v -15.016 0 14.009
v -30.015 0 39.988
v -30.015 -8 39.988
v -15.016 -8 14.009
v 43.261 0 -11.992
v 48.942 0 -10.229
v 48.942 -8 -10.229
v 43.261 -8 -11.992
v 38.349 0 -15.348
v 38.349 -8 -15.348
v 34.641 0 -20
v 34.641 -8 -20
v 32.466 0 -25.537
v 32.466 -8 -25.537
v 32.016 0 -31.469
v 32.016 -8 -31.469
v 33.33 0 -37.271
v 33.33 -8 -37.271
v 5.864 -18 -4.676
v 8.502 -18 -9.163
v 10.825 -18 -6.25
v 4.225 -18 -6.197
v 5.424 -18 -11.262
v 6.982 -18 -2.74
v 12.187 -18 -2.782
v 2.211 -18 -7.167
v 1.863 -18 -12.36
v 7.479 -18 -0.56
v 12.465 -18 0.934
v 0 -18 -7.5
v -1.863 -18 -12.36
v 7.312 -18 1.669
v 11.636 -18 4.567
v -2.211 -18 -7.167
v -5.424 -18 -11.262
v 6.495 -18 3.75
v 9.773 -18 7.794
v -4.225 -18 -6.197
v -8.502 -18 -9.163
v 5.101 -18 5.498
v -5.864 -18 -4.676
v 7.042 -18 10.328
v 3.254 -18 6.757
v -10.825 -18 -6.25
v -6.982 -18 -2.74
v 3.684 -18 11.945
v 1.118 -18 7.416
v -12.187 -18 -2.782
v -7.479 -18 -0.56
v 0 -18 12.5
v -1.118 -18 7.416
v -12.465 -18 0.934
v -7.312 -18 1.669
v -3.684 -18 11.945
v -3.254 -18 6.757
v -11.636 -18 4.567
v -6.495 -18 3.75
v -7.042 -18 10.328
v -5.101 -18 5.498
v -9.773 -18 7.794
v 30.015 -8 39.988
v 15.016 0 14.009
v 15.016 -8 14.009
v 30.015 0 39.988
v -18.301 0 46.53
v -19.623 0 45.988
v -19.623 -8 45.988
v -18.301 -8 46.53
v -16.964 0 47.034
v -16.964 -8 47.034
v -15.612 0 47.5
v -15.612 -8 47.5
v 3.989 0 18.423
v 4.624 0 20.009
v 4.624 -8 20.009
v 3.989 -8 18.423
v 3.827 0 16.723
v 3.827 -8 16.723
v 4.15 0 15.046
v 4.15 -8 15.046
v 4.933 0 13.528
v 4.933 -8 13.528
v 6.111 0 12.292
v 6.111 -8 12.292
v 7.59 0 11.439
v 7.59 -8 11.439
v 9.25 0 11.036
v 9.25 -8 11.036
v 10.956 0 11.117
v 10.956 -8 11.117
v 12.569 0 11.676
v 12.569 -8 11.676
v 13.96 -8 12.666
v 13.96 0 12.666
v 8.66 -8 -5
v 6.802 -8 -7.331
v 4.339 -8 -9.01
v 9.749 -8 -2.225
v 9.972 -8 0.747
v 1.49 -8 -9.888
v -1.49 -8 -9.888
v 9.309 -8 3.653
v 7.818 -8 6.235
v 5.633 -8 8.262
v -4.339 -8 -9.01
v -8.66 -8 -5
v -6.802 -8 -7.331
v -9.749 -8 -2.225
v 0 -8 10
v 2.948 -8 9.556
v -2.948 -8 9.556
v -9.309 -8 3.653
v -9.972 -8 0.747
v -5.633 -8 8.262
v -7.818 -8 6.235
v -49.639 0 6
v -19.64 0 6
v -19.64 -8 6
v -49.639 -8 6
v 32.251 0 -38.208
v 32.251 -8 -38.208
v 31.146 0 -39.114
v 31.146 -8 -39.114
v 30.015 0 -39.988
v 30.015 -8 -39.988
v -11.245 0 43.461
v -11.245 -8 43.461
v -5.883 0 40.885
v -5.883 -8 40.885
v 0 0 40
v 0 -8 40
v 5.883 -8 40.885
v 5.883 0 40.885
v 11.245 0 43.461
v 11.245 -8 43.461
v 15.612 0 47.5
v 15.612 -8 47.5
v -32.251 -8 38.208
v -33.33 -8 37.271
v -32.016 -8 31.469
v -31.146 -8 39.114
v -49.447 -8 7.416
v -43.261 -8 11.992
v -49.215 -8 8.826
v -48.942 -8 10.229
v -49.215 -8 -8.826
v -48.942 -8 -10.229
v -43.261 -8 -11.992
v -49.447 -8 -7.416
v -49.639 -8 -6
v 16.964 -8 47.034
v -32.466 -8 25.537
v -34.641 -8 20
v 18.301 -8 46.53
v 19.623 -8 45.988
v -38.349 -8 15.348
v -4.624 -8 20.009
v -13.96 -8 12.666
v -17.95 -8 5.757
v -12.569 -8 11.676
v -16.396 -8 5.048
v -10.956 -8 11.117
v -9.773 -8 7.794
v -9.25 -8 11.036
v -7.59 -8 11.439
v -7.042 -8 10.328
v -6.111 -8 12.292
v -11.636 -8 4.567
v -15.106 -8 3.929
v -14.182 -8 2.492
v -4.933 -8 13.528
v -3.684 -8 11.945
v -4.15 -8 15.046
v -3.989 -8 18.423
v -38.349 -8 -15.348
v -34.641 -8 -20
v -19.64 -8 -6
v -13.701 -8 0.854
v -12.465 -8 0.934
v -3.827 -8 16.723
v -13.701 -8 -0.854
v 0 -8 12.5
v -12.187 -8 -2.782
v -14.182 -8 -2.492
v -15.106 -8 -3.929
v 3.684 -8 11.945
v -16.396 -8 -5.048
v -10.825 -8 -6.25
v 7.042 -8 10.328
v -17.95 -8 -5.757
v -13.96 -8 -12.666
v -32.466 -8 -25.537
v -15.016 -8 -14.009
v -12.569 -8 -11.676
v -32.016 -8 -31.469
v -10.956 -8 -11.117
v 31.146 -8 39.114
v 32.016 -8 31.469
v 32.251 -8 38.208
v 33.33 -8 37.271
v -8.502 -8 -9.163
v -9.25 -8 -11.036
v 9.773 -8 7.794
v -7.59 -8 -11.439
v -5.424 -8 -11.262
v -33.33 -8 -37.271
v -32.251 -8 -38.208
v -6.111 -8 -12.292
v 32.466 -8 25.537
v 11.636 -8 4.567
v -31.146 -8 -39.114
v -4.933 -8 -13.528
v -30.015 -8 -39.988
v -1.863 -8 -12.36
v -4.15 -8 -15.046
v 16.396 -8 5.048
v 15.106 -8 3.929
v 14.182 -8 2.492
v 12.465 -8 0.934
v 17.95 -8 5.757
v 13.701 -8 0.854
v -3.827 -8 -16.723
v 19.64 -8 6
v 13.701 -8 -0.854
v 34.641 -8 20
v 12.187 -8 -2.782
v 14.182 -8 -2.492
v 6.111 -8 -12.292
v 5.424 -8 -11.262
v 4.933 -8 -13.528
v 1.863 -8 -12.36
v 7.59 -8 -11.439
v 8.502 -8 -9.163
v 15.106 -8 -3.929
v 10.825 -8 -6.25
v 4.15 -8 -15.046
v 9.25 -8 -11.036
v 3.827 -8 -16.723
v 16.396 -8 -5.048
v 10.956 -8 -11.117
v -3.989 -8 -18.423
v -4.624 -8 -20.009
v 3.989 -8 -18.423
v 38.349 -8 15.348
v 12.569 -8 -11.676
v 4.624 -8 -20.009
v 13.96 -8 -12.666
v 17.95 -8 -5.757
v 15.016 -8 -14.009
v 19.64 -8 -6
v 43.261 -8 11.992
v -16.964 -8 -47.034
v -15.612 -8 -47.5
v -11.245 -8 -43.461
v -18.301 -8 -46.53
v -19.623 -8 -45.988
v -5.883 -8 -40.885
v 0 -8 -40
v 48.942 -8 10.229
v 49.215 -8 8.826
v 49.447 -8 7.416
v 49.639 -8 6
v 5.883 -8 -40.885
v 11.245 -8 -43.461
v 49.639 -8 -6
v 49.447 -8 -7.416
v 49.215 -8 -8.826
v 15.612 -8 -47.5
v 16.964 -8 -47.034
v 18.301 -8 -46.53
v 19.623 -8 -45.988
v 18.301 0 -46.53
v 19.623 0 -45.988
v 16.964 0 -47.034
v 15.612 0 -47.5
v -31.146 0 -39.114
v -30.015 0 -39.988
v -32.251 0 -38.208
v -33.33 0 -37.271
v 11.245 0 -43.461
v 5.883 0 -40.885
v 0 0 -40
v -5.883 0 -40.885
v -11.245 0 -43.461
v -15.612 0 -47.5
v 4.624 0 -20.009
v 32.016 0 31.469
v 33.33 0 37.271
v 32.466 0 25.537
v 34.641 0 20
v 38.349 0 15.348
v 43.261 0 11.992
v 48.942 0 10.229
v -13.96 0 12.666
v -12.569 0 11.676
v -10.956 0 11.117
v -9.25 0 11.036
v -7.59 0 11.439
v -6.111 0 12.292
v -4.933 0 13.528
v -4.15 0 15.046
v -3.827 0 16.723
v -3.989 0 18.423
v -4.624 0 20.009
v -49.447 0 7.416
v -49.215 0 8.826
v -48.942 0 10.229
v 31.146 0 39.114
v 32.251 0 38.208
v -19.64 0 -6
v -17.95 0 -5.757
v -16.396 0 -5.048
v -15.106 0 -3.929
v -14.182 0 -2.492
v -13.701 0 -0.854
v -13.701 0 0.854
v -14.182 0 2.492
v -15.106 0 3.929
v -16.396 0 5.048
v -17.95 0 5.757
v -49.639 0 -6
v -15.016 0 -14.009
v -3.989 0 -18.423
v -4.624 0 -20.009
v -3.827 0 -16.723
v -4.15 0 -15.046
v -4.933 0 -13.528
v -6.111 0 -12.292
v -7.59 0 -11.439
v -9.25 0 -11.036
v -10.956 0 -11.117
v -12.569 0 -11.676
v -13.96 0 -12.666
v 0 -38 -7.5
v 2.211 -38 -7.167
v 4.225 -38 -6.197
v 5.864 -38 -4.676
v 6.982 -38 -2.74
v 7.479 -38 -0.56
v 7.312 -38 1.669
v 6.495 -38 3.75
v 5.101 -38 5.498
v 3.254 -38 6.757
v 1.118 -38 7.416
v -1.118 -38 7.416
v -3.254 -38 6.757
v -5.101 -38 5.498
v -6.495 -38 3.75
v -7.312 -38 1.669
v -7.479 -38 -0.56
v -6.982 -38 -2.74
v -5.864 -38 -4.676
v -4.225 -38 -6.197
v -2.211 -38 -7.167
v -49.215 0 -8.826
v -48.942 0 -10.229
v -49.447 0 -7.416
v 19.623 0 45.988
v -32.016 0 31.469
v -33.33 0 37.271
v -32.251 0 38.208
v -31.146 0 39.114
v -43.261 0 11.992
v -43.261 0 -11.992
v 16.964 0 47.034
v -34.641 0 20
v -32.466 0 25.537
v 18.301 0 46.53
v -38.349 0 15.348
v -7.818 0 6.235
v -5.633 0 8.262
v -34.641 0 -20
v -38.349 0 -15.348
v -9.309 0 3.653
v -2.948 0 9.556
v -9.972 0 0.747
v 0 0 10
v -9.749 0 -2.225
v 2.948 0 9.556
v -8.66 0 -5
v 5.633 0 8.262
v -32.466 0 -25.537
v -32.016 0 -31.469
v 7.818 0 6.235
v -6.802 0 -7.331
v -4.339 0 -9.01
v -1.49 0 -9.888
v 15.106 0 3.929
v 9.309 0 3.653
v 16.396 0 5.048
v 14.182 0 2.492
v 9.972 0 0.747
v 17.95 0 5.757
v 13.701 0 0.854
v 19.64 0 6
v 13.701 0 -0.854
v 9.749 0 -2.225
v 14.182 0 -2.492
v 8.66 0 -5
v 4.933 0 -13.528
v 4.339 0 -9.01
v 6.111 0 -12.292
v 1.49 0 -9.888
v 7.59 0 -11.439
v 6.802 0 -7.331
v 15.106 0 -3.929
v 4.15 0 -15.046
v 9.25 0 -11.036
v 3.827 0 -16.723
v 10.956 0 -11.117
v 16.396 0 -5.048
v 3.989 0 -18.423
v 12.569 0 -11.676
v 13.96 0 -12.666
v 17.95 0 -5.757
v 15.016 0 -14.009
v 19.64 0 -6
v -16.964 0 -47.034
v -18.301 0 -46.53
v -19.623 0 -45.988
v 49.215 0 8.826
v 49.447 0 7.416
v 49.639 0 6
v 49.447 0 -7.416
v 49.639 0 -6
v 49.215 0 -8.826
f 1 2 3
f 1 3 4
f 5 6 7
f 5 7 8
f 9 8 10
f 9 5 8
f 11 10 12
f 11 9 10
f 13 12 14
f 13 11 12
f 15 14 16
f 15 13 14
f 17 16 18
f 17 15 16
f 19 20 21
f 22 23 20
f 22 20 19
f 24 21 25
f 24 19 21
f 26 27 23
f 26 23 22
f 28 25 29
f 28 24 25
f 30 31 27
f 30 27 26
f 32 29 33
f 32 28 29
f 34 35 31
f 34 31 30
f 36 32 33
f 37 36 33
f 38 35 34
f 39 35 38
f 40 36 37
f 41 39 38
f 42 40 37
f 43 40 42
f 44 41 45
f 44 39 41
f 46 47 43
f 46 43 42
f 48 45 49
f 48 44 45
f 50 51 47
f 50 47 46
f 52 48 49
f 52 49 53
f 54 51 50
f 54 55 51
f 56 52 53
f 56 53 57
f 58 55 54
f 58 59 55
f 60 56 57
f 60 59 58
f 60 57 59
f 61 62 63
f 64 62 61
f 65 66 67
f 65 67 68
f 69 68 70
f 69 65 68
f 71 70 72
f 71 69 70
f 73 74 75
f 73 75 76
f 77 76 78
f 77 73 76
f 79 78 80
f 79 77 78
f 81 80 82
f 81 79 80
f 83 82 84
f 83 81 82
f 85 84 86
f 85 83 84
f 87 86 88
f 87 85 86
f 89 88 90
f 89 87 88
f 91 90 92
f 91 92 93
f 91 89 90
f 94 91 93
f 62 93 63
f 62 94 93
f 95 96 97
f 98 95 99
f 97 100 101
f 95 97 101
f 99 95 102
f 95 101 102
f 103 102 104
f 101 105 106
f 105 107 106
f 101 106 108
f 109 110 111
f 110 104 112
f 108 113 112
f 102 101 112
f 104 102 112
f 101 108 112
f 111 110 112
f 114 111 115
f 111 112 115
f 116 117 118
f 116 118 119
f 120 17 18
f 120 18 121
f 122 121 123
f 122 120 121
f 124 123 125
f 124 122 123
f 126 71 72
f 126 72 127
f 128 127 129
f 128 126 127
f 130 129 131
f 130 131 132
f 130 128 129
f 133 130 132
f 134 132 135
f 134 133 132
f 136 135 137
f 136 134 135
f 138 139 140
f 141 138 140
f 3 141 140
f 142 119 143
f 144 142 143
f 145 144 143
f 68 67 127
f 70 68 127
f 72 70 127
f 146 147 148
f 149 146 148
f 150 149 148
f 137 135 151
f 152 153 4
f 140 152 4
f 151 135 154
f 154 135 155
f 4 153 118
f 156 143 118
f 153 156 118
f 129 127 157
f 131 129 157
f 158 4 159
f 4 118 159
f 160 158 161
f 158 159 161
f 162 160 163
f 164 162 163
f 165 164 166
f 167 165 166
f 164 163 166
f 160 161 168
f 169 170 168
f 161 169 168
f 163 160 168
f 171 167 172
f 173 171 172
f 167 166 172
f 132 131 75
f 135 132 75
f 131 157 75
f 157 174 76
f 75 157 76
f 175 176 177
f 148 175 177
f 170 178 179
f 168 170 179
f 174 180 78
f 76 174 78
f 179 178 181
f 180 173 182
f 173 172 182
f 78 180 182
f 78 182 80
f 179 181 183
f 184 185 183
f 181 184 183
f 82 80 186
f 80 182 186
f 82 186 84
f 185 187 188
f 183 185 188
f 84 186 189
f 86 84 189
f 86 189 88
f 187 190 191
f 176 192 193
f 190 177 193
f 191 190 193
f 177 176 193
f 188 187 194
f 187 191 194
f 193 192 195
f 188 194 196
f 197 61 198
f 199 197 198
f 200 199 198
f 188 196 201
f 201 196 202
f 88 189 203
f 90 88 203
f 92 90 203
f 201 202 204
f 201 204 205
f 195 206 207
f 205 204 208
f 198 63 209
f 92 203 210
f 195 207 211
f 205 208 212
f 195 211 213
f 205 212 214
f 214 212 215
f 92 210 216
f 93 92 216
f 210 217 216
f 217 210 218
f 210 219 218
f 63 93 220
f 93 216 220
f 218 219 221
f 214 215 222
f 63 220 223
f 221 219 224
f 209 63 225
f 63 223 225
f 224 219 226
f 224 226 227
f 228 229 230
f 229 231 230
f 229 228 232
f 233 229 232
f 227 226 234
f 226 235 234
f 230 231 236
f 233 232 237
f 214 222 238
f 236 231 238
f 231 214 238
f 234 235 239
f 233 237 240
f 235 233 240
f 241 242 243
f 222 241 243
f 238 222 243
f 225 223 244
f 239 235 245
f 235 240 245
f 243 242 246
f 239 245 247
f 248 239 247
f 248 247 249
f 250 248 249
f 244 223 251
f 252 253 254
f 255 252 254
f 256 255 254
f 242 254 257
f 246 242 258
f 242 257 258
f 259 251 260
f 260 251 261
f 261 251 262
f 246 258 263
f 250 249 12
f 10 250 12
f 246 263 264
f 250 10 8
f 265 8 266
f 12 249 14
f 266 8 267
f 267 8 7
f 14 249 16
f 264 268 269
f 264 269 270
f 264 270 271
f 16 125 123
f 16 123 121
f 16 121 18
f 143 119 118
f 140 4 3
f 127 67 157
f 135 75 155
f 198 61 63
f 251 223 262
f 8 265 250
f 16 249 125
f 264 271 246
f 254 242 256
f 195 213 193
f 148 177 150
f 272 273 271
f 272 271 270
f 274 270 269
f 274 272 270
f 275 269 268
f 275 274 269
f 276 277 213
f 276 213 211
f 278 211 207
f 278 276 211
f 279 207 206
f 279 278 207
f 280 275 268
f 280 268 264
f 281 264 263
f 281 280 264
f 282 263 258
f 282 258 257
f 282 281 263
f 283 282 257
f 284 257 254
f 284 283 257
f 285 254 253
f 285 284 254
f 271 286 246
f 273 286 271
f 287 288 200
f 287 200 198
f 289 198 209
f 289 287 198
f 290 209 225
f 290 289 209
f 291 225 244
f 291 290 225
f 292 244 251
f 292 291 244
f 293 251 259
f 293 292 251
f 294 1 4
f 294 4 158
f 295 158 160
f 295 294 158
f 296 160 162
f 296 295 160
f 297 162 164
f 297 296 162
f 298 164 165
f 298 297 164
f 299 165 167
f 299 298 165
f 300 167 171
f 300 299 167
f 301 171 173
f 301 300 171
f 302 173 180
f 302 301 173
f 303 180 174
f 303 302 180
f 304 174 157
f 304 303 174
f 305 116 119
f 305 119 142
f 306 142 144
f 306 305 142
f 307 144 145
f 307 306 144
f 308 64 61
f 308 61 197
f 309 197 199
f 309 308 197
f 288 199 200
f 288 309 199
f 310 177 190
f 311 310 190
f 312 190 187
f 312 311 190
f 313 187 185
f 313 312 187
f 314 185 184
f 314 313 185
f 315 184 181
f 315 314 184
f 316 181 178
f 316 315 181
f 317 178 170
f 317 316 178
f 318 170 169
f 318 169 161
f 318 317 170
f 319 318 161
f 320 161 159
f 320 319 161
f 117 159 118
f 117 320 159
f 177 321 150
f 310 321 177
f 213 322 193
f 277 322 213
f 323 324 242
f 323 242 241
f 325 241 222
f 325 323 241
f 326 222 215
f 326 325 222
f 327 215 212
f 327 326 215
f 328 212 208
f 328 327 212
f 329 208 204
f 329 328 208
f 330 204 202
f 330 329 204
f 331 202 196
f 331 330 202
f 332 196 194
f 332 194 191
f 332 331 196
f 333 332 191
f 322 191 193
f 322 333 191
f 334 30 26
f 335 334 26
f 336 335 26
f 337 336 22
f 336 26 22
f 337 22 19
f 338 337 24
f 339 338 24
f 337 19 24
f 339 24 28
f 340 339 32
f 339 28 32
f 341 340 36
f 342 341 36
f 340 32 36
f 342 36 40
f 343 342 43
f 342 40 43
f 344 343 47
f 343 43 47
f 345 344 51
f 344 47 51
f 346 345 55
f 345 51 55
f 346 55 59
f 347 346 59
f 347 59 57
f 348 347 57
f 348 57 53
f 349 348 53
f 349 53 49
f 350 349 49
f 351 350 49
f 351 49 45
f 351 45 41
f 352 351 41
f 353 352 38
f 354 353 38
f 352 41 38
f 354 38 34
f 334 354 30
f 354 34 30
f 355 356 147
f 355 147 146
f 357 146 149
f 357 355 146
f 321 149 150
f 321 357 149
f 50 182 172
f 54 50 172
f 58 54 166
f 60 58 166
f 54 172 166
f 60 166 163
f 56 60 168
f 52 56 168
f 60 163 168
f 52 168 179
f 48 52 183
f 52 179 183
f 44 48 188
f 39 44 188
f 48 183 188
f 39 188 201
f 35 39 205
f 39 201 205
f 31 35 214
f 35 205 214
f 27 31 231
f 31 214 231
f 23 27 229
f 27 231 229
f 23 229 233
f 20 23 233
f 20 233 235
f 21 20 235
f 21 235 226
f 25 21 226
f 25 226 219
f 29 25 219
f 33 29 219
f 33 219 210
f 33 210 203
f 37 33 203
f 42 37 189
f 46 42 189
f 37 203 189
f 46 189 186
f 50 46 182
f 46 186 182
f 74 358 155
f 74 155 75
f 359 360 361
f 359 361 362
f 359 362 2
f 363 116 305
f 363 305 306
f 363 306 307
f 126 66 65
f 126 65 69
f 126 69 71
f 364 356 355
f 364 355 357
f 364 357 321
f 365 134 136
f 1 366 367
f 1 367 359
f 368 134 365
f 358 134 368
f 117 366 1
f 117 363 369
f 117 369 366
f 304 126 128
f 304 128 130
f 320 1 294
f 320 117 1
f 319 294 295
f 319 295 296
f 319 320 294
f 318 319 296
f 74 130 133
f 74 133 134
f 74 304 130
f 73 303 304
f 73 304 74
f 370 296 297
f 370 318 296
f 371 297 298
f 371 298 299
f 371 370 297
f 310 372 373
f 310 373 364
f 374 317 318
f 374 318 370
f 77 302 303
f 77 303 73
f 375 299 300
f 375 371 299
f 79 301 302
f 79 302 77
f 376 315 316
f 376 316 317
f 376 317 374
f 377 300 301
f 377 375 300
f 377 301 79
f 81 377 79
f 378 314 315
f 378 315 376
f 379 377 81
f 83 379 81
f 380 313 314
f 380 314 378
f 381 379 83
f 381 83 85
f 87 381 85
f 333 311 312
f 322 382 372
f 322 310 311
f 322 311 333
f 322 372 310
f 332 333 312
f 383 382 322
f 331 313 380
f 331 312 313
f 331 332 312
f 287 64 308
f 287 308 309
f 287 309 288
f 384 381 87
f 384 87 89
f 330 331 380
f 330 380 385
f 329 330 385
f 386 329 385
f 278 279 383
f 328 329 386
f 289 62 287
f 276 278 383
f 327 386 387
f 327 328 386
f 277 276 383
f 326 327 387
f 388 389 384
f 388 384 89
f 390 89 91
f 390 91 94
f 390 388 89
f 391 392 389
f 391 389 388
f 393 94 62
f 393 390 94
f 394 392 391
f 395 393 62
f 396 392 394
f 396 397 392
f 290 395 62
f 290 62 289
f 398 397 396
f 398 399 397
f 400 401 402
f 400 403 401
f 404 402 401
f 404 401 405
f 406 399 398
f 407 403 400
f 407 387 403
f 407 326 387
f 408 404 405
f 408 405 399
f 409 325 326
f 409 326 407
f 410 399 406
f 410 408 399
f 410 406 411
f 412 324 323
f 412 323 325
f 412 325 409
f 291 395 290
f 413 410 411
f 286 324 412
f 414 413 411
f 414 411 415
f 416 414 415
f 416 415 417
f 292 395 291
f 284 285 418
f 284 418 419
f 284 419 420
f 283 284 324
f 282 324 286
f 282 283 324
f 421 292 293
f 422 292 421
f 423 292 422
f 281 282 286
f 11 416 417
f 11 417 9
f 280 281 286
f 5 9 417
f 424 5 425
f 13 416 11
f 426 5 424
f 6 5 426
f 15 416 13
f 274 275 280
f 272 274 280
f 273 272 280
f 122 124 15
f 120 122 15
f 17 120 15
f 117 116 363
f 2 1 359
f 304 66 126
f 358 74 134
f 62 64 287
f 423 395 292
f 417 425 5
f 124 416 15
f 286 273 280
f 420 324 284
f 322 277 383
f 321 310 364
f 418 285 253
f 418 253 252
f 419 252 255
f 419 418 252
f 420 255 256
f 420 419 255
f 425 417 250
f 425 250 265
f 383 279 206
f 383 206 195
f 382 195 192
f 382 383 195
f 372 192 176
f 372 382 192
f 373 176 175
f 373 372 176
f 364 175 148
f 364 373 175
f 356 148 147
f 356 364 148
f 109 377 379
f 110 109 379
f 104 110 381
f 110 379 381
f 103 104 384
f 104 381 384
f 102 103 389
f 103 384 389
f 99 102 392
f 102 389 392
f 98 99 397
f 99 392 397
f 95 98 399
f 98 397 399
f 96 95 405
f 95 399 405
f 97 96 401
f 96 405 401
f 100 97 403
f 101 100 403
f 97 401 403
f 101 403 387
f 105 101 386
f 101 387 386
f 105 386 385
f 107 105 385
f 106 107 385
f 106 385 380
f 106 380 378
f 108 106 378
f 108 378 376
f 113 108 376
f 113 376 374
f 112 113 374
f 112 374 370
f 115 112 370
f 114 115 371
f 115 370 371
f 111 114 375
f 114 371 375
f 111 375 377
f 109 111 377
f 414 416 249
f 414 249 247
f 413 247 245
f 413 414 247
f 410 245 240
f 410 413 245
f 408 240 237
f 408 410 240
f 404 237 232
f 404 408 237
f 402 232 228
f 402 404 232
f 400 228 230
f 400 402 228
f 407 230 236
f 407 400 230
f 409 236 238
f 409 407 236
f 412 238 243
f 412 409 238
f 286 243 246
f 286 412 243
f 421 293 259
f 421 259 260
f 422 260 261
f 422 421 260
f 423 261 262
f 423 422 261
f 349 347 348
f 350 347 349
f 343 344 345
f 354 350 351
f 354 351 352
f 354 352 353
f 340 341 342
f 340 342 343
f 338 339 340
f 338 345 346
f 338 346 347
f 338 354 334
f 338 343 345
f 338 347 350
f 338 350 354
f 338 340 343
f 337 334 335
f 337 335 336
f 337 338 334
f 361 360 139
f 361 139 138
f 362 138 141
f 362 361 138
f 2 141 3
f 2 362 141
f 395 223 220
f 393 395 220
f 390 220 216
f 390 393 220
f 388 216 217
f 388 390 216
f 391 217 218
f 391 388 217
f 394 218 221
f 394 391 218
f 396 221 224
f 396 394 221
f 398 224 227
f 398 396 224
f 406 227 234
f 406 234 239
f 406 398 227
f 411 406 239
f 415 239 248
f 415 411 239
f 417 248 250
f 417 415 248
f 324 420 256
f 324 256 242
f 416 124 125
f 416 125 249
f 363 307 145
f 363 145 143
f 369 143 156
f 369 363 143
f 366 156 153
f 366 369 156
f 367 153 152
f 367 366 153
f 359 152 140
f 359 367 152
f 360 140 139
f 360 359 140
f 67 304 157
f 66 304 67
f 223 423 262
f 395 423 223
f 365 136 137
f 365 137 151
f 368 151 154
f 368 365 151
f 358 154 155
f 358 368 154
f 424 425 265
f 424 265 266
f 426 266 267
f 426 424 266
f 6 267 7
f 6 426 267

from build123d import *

# Parameters (mm, degrees)
SKETCH1_R           = 10
BOSS_EXTRUDE1_DEPTH = 8
SKETCH2_R           = 12.5
BOSS_EXTRUDE2_DEPTH = 10
SKETCH3_R           = 7.5
BOSS_EXTRUDE3_DEPTH = 20


with BuildPart() as part:
    # Sketch1 → Boss-Extrude1 (new body)
    with BuildSketch(Plane(origin=(0, 0, 0), x_dir=(1, 0, 0), z_dir=(0, 1, 0))):
        with BuildLine():
            Line((-19.64, -6), (-49.638694584, -6))
            ThreePointArc((-49.638694584, -6), (-49.335912066, -8.122055195), (-48.942454178, -10.229182717))
            ThreePointArc((-48.942454178, -10.229182717), (-34.641016151, -20), (-33.329959182, -37.270817283))
            ThreePointArc((-33.329959182, -37.270817283), (-31.701862163, -38.665125571), (-30.015499715, -39.98837052))
            Line((-30.015499715, -39.98837052), (-15.016152423, -14.00873893))
            ThreePointArc((-15.016152423, -14.00873893), (-6.82, -11.812586508), (-4.623847577, -20.00873893))
            Line((-4.623847577, -20.00873893), (-19.623194869, -45.98837052))
            ThreePointArc((-19.623194869, -45.98837052), (-17.634049903, -46.787180766), (-15.612494996, -47.5))
            ThreePointArc((-15.612494996, -47.5), (0, -40), (15.612494996, -47.5))
            ThreePointArc((15.612494996, -47.5), (17.634049903, -46.787180766), (19.623194869, -45.98837052))
            Line((19.623194869, -45.98837052), (4.623847577, -20.00873893))
            ThreePointArc((4.623847577, -20.00873893), (6.82, -11.812586508), (15.016152423, -14.00873893))
            Line((15.016152423, -14.00873893), (30.015499715, -39.98837052))
            ThreePointArc((30.015499715, -39.98837052), (31.701862163, -38.665125571), (33.329959182, -37.270817283))
            ThreePointArc((33.329959182, -37.270817283), (34.641016151, -20), (48.942454178, -10.229182717))
            ThreePointArc((48.942454178, -10.229182717), (49.335912066, -8.122055195), (49.638694584, -6))
            Line((49.638694584, -6), (19.64, -6))
            ThreePointArc((19.64, -6), (13.64, 0), (19.64, 6))
            Line((19.64, 6), (49.638694584, 6))
            ThreePointArc((49.638694584, 6), (49.335912066, 8.122055195), (48.942454178, 10.229182717))
            ThreePointArc((48.942454178, 10.229182717), (34.641016151, 20), (33.329959182, 37.270817283))
            ThreePointArc((33.329959182, 37.270817283), (31.701862163, 38.665125571), (30.015499715, 39.98837052))
            Line((30.015499715, 39.98837052), (15.016152423, 14.00873893))
            ThreePointArc((15.016152423, 14.00873893), (6.82, 11.812586508), (4.623847577, 20.00873893))
            Line((4.623847577, 20.00873893), (19.623194869, 45.98837052))
            ThreePointArc((19.623194869, 45.98837052), (17.634049903, 46.787180766), (15.612494996, 47.5))
            ThreePointArc((15.612494996, 47.5), (0, 40), (-15.612494996, 47.5))
            ThreePointArc((-15.612494996, 47.5), (-17.634049903, 46.787180766), (-19.623194869, 45.98837052))
            Line((-19.623194869, 45.98837052), (-4.623847577, 20.00873893))
            ThreePointArc((-4.623847577, 20.00873893), (-6.82, 11.812586508), (-15.016152423, 14.00873893))
            Line((-15.016152423, 14.00873893), (-30.015499715, 39.98837052))
            ThreePointArc((-30.015499715, 39.98837052), (-31.701862163, 38.665125571), (-33.329959182, 37.270817283))
            ThreePointArc((-33.329959182, 37.270817283), (-34.641016151, 20), (-48.942454178, 10.229182717))
            ThreePointArc((-48.942454178, 10.229182717), (-49.335912066, 8.122055195), (-49.638694584, 6))
            Line((-49.638694584, 6), (-19.64, 6))
            ThreePointArc((-19.64, 6), (-13.64, 0), (-19.64, -6))
        make_face()
        with Locations(Location((0, 0, 0), (0, 0, 270))):
            Circle(SKETCH1_R, mode=Mode.SUBTRACT)
    extrude(amount=-BOSS_EXTRUDE1_DEPTH)

    # Sketch2 → Boss-Extrude2 (add)
    with BuildSketch(Plane.XZ.offset(8)):
        with Locations(Location((0, 0, 0), (0, 0, 90))):
            Circle(SKETCH2_R)
    extrude(amount=BOSS_EXTRUDE2_DEPTH)

    # Sketch3 → Boss-Extrude3 (add)
    with BuildSketch(Plane.XZ.offset(18)):
        with Locations(Location((0, 0, 0), (0, 0, 270))):
            Circle(SKETCH3_R)
    extrude(amount=BOSS_EXTRUDE3_DEPTH)


solid = part.part
